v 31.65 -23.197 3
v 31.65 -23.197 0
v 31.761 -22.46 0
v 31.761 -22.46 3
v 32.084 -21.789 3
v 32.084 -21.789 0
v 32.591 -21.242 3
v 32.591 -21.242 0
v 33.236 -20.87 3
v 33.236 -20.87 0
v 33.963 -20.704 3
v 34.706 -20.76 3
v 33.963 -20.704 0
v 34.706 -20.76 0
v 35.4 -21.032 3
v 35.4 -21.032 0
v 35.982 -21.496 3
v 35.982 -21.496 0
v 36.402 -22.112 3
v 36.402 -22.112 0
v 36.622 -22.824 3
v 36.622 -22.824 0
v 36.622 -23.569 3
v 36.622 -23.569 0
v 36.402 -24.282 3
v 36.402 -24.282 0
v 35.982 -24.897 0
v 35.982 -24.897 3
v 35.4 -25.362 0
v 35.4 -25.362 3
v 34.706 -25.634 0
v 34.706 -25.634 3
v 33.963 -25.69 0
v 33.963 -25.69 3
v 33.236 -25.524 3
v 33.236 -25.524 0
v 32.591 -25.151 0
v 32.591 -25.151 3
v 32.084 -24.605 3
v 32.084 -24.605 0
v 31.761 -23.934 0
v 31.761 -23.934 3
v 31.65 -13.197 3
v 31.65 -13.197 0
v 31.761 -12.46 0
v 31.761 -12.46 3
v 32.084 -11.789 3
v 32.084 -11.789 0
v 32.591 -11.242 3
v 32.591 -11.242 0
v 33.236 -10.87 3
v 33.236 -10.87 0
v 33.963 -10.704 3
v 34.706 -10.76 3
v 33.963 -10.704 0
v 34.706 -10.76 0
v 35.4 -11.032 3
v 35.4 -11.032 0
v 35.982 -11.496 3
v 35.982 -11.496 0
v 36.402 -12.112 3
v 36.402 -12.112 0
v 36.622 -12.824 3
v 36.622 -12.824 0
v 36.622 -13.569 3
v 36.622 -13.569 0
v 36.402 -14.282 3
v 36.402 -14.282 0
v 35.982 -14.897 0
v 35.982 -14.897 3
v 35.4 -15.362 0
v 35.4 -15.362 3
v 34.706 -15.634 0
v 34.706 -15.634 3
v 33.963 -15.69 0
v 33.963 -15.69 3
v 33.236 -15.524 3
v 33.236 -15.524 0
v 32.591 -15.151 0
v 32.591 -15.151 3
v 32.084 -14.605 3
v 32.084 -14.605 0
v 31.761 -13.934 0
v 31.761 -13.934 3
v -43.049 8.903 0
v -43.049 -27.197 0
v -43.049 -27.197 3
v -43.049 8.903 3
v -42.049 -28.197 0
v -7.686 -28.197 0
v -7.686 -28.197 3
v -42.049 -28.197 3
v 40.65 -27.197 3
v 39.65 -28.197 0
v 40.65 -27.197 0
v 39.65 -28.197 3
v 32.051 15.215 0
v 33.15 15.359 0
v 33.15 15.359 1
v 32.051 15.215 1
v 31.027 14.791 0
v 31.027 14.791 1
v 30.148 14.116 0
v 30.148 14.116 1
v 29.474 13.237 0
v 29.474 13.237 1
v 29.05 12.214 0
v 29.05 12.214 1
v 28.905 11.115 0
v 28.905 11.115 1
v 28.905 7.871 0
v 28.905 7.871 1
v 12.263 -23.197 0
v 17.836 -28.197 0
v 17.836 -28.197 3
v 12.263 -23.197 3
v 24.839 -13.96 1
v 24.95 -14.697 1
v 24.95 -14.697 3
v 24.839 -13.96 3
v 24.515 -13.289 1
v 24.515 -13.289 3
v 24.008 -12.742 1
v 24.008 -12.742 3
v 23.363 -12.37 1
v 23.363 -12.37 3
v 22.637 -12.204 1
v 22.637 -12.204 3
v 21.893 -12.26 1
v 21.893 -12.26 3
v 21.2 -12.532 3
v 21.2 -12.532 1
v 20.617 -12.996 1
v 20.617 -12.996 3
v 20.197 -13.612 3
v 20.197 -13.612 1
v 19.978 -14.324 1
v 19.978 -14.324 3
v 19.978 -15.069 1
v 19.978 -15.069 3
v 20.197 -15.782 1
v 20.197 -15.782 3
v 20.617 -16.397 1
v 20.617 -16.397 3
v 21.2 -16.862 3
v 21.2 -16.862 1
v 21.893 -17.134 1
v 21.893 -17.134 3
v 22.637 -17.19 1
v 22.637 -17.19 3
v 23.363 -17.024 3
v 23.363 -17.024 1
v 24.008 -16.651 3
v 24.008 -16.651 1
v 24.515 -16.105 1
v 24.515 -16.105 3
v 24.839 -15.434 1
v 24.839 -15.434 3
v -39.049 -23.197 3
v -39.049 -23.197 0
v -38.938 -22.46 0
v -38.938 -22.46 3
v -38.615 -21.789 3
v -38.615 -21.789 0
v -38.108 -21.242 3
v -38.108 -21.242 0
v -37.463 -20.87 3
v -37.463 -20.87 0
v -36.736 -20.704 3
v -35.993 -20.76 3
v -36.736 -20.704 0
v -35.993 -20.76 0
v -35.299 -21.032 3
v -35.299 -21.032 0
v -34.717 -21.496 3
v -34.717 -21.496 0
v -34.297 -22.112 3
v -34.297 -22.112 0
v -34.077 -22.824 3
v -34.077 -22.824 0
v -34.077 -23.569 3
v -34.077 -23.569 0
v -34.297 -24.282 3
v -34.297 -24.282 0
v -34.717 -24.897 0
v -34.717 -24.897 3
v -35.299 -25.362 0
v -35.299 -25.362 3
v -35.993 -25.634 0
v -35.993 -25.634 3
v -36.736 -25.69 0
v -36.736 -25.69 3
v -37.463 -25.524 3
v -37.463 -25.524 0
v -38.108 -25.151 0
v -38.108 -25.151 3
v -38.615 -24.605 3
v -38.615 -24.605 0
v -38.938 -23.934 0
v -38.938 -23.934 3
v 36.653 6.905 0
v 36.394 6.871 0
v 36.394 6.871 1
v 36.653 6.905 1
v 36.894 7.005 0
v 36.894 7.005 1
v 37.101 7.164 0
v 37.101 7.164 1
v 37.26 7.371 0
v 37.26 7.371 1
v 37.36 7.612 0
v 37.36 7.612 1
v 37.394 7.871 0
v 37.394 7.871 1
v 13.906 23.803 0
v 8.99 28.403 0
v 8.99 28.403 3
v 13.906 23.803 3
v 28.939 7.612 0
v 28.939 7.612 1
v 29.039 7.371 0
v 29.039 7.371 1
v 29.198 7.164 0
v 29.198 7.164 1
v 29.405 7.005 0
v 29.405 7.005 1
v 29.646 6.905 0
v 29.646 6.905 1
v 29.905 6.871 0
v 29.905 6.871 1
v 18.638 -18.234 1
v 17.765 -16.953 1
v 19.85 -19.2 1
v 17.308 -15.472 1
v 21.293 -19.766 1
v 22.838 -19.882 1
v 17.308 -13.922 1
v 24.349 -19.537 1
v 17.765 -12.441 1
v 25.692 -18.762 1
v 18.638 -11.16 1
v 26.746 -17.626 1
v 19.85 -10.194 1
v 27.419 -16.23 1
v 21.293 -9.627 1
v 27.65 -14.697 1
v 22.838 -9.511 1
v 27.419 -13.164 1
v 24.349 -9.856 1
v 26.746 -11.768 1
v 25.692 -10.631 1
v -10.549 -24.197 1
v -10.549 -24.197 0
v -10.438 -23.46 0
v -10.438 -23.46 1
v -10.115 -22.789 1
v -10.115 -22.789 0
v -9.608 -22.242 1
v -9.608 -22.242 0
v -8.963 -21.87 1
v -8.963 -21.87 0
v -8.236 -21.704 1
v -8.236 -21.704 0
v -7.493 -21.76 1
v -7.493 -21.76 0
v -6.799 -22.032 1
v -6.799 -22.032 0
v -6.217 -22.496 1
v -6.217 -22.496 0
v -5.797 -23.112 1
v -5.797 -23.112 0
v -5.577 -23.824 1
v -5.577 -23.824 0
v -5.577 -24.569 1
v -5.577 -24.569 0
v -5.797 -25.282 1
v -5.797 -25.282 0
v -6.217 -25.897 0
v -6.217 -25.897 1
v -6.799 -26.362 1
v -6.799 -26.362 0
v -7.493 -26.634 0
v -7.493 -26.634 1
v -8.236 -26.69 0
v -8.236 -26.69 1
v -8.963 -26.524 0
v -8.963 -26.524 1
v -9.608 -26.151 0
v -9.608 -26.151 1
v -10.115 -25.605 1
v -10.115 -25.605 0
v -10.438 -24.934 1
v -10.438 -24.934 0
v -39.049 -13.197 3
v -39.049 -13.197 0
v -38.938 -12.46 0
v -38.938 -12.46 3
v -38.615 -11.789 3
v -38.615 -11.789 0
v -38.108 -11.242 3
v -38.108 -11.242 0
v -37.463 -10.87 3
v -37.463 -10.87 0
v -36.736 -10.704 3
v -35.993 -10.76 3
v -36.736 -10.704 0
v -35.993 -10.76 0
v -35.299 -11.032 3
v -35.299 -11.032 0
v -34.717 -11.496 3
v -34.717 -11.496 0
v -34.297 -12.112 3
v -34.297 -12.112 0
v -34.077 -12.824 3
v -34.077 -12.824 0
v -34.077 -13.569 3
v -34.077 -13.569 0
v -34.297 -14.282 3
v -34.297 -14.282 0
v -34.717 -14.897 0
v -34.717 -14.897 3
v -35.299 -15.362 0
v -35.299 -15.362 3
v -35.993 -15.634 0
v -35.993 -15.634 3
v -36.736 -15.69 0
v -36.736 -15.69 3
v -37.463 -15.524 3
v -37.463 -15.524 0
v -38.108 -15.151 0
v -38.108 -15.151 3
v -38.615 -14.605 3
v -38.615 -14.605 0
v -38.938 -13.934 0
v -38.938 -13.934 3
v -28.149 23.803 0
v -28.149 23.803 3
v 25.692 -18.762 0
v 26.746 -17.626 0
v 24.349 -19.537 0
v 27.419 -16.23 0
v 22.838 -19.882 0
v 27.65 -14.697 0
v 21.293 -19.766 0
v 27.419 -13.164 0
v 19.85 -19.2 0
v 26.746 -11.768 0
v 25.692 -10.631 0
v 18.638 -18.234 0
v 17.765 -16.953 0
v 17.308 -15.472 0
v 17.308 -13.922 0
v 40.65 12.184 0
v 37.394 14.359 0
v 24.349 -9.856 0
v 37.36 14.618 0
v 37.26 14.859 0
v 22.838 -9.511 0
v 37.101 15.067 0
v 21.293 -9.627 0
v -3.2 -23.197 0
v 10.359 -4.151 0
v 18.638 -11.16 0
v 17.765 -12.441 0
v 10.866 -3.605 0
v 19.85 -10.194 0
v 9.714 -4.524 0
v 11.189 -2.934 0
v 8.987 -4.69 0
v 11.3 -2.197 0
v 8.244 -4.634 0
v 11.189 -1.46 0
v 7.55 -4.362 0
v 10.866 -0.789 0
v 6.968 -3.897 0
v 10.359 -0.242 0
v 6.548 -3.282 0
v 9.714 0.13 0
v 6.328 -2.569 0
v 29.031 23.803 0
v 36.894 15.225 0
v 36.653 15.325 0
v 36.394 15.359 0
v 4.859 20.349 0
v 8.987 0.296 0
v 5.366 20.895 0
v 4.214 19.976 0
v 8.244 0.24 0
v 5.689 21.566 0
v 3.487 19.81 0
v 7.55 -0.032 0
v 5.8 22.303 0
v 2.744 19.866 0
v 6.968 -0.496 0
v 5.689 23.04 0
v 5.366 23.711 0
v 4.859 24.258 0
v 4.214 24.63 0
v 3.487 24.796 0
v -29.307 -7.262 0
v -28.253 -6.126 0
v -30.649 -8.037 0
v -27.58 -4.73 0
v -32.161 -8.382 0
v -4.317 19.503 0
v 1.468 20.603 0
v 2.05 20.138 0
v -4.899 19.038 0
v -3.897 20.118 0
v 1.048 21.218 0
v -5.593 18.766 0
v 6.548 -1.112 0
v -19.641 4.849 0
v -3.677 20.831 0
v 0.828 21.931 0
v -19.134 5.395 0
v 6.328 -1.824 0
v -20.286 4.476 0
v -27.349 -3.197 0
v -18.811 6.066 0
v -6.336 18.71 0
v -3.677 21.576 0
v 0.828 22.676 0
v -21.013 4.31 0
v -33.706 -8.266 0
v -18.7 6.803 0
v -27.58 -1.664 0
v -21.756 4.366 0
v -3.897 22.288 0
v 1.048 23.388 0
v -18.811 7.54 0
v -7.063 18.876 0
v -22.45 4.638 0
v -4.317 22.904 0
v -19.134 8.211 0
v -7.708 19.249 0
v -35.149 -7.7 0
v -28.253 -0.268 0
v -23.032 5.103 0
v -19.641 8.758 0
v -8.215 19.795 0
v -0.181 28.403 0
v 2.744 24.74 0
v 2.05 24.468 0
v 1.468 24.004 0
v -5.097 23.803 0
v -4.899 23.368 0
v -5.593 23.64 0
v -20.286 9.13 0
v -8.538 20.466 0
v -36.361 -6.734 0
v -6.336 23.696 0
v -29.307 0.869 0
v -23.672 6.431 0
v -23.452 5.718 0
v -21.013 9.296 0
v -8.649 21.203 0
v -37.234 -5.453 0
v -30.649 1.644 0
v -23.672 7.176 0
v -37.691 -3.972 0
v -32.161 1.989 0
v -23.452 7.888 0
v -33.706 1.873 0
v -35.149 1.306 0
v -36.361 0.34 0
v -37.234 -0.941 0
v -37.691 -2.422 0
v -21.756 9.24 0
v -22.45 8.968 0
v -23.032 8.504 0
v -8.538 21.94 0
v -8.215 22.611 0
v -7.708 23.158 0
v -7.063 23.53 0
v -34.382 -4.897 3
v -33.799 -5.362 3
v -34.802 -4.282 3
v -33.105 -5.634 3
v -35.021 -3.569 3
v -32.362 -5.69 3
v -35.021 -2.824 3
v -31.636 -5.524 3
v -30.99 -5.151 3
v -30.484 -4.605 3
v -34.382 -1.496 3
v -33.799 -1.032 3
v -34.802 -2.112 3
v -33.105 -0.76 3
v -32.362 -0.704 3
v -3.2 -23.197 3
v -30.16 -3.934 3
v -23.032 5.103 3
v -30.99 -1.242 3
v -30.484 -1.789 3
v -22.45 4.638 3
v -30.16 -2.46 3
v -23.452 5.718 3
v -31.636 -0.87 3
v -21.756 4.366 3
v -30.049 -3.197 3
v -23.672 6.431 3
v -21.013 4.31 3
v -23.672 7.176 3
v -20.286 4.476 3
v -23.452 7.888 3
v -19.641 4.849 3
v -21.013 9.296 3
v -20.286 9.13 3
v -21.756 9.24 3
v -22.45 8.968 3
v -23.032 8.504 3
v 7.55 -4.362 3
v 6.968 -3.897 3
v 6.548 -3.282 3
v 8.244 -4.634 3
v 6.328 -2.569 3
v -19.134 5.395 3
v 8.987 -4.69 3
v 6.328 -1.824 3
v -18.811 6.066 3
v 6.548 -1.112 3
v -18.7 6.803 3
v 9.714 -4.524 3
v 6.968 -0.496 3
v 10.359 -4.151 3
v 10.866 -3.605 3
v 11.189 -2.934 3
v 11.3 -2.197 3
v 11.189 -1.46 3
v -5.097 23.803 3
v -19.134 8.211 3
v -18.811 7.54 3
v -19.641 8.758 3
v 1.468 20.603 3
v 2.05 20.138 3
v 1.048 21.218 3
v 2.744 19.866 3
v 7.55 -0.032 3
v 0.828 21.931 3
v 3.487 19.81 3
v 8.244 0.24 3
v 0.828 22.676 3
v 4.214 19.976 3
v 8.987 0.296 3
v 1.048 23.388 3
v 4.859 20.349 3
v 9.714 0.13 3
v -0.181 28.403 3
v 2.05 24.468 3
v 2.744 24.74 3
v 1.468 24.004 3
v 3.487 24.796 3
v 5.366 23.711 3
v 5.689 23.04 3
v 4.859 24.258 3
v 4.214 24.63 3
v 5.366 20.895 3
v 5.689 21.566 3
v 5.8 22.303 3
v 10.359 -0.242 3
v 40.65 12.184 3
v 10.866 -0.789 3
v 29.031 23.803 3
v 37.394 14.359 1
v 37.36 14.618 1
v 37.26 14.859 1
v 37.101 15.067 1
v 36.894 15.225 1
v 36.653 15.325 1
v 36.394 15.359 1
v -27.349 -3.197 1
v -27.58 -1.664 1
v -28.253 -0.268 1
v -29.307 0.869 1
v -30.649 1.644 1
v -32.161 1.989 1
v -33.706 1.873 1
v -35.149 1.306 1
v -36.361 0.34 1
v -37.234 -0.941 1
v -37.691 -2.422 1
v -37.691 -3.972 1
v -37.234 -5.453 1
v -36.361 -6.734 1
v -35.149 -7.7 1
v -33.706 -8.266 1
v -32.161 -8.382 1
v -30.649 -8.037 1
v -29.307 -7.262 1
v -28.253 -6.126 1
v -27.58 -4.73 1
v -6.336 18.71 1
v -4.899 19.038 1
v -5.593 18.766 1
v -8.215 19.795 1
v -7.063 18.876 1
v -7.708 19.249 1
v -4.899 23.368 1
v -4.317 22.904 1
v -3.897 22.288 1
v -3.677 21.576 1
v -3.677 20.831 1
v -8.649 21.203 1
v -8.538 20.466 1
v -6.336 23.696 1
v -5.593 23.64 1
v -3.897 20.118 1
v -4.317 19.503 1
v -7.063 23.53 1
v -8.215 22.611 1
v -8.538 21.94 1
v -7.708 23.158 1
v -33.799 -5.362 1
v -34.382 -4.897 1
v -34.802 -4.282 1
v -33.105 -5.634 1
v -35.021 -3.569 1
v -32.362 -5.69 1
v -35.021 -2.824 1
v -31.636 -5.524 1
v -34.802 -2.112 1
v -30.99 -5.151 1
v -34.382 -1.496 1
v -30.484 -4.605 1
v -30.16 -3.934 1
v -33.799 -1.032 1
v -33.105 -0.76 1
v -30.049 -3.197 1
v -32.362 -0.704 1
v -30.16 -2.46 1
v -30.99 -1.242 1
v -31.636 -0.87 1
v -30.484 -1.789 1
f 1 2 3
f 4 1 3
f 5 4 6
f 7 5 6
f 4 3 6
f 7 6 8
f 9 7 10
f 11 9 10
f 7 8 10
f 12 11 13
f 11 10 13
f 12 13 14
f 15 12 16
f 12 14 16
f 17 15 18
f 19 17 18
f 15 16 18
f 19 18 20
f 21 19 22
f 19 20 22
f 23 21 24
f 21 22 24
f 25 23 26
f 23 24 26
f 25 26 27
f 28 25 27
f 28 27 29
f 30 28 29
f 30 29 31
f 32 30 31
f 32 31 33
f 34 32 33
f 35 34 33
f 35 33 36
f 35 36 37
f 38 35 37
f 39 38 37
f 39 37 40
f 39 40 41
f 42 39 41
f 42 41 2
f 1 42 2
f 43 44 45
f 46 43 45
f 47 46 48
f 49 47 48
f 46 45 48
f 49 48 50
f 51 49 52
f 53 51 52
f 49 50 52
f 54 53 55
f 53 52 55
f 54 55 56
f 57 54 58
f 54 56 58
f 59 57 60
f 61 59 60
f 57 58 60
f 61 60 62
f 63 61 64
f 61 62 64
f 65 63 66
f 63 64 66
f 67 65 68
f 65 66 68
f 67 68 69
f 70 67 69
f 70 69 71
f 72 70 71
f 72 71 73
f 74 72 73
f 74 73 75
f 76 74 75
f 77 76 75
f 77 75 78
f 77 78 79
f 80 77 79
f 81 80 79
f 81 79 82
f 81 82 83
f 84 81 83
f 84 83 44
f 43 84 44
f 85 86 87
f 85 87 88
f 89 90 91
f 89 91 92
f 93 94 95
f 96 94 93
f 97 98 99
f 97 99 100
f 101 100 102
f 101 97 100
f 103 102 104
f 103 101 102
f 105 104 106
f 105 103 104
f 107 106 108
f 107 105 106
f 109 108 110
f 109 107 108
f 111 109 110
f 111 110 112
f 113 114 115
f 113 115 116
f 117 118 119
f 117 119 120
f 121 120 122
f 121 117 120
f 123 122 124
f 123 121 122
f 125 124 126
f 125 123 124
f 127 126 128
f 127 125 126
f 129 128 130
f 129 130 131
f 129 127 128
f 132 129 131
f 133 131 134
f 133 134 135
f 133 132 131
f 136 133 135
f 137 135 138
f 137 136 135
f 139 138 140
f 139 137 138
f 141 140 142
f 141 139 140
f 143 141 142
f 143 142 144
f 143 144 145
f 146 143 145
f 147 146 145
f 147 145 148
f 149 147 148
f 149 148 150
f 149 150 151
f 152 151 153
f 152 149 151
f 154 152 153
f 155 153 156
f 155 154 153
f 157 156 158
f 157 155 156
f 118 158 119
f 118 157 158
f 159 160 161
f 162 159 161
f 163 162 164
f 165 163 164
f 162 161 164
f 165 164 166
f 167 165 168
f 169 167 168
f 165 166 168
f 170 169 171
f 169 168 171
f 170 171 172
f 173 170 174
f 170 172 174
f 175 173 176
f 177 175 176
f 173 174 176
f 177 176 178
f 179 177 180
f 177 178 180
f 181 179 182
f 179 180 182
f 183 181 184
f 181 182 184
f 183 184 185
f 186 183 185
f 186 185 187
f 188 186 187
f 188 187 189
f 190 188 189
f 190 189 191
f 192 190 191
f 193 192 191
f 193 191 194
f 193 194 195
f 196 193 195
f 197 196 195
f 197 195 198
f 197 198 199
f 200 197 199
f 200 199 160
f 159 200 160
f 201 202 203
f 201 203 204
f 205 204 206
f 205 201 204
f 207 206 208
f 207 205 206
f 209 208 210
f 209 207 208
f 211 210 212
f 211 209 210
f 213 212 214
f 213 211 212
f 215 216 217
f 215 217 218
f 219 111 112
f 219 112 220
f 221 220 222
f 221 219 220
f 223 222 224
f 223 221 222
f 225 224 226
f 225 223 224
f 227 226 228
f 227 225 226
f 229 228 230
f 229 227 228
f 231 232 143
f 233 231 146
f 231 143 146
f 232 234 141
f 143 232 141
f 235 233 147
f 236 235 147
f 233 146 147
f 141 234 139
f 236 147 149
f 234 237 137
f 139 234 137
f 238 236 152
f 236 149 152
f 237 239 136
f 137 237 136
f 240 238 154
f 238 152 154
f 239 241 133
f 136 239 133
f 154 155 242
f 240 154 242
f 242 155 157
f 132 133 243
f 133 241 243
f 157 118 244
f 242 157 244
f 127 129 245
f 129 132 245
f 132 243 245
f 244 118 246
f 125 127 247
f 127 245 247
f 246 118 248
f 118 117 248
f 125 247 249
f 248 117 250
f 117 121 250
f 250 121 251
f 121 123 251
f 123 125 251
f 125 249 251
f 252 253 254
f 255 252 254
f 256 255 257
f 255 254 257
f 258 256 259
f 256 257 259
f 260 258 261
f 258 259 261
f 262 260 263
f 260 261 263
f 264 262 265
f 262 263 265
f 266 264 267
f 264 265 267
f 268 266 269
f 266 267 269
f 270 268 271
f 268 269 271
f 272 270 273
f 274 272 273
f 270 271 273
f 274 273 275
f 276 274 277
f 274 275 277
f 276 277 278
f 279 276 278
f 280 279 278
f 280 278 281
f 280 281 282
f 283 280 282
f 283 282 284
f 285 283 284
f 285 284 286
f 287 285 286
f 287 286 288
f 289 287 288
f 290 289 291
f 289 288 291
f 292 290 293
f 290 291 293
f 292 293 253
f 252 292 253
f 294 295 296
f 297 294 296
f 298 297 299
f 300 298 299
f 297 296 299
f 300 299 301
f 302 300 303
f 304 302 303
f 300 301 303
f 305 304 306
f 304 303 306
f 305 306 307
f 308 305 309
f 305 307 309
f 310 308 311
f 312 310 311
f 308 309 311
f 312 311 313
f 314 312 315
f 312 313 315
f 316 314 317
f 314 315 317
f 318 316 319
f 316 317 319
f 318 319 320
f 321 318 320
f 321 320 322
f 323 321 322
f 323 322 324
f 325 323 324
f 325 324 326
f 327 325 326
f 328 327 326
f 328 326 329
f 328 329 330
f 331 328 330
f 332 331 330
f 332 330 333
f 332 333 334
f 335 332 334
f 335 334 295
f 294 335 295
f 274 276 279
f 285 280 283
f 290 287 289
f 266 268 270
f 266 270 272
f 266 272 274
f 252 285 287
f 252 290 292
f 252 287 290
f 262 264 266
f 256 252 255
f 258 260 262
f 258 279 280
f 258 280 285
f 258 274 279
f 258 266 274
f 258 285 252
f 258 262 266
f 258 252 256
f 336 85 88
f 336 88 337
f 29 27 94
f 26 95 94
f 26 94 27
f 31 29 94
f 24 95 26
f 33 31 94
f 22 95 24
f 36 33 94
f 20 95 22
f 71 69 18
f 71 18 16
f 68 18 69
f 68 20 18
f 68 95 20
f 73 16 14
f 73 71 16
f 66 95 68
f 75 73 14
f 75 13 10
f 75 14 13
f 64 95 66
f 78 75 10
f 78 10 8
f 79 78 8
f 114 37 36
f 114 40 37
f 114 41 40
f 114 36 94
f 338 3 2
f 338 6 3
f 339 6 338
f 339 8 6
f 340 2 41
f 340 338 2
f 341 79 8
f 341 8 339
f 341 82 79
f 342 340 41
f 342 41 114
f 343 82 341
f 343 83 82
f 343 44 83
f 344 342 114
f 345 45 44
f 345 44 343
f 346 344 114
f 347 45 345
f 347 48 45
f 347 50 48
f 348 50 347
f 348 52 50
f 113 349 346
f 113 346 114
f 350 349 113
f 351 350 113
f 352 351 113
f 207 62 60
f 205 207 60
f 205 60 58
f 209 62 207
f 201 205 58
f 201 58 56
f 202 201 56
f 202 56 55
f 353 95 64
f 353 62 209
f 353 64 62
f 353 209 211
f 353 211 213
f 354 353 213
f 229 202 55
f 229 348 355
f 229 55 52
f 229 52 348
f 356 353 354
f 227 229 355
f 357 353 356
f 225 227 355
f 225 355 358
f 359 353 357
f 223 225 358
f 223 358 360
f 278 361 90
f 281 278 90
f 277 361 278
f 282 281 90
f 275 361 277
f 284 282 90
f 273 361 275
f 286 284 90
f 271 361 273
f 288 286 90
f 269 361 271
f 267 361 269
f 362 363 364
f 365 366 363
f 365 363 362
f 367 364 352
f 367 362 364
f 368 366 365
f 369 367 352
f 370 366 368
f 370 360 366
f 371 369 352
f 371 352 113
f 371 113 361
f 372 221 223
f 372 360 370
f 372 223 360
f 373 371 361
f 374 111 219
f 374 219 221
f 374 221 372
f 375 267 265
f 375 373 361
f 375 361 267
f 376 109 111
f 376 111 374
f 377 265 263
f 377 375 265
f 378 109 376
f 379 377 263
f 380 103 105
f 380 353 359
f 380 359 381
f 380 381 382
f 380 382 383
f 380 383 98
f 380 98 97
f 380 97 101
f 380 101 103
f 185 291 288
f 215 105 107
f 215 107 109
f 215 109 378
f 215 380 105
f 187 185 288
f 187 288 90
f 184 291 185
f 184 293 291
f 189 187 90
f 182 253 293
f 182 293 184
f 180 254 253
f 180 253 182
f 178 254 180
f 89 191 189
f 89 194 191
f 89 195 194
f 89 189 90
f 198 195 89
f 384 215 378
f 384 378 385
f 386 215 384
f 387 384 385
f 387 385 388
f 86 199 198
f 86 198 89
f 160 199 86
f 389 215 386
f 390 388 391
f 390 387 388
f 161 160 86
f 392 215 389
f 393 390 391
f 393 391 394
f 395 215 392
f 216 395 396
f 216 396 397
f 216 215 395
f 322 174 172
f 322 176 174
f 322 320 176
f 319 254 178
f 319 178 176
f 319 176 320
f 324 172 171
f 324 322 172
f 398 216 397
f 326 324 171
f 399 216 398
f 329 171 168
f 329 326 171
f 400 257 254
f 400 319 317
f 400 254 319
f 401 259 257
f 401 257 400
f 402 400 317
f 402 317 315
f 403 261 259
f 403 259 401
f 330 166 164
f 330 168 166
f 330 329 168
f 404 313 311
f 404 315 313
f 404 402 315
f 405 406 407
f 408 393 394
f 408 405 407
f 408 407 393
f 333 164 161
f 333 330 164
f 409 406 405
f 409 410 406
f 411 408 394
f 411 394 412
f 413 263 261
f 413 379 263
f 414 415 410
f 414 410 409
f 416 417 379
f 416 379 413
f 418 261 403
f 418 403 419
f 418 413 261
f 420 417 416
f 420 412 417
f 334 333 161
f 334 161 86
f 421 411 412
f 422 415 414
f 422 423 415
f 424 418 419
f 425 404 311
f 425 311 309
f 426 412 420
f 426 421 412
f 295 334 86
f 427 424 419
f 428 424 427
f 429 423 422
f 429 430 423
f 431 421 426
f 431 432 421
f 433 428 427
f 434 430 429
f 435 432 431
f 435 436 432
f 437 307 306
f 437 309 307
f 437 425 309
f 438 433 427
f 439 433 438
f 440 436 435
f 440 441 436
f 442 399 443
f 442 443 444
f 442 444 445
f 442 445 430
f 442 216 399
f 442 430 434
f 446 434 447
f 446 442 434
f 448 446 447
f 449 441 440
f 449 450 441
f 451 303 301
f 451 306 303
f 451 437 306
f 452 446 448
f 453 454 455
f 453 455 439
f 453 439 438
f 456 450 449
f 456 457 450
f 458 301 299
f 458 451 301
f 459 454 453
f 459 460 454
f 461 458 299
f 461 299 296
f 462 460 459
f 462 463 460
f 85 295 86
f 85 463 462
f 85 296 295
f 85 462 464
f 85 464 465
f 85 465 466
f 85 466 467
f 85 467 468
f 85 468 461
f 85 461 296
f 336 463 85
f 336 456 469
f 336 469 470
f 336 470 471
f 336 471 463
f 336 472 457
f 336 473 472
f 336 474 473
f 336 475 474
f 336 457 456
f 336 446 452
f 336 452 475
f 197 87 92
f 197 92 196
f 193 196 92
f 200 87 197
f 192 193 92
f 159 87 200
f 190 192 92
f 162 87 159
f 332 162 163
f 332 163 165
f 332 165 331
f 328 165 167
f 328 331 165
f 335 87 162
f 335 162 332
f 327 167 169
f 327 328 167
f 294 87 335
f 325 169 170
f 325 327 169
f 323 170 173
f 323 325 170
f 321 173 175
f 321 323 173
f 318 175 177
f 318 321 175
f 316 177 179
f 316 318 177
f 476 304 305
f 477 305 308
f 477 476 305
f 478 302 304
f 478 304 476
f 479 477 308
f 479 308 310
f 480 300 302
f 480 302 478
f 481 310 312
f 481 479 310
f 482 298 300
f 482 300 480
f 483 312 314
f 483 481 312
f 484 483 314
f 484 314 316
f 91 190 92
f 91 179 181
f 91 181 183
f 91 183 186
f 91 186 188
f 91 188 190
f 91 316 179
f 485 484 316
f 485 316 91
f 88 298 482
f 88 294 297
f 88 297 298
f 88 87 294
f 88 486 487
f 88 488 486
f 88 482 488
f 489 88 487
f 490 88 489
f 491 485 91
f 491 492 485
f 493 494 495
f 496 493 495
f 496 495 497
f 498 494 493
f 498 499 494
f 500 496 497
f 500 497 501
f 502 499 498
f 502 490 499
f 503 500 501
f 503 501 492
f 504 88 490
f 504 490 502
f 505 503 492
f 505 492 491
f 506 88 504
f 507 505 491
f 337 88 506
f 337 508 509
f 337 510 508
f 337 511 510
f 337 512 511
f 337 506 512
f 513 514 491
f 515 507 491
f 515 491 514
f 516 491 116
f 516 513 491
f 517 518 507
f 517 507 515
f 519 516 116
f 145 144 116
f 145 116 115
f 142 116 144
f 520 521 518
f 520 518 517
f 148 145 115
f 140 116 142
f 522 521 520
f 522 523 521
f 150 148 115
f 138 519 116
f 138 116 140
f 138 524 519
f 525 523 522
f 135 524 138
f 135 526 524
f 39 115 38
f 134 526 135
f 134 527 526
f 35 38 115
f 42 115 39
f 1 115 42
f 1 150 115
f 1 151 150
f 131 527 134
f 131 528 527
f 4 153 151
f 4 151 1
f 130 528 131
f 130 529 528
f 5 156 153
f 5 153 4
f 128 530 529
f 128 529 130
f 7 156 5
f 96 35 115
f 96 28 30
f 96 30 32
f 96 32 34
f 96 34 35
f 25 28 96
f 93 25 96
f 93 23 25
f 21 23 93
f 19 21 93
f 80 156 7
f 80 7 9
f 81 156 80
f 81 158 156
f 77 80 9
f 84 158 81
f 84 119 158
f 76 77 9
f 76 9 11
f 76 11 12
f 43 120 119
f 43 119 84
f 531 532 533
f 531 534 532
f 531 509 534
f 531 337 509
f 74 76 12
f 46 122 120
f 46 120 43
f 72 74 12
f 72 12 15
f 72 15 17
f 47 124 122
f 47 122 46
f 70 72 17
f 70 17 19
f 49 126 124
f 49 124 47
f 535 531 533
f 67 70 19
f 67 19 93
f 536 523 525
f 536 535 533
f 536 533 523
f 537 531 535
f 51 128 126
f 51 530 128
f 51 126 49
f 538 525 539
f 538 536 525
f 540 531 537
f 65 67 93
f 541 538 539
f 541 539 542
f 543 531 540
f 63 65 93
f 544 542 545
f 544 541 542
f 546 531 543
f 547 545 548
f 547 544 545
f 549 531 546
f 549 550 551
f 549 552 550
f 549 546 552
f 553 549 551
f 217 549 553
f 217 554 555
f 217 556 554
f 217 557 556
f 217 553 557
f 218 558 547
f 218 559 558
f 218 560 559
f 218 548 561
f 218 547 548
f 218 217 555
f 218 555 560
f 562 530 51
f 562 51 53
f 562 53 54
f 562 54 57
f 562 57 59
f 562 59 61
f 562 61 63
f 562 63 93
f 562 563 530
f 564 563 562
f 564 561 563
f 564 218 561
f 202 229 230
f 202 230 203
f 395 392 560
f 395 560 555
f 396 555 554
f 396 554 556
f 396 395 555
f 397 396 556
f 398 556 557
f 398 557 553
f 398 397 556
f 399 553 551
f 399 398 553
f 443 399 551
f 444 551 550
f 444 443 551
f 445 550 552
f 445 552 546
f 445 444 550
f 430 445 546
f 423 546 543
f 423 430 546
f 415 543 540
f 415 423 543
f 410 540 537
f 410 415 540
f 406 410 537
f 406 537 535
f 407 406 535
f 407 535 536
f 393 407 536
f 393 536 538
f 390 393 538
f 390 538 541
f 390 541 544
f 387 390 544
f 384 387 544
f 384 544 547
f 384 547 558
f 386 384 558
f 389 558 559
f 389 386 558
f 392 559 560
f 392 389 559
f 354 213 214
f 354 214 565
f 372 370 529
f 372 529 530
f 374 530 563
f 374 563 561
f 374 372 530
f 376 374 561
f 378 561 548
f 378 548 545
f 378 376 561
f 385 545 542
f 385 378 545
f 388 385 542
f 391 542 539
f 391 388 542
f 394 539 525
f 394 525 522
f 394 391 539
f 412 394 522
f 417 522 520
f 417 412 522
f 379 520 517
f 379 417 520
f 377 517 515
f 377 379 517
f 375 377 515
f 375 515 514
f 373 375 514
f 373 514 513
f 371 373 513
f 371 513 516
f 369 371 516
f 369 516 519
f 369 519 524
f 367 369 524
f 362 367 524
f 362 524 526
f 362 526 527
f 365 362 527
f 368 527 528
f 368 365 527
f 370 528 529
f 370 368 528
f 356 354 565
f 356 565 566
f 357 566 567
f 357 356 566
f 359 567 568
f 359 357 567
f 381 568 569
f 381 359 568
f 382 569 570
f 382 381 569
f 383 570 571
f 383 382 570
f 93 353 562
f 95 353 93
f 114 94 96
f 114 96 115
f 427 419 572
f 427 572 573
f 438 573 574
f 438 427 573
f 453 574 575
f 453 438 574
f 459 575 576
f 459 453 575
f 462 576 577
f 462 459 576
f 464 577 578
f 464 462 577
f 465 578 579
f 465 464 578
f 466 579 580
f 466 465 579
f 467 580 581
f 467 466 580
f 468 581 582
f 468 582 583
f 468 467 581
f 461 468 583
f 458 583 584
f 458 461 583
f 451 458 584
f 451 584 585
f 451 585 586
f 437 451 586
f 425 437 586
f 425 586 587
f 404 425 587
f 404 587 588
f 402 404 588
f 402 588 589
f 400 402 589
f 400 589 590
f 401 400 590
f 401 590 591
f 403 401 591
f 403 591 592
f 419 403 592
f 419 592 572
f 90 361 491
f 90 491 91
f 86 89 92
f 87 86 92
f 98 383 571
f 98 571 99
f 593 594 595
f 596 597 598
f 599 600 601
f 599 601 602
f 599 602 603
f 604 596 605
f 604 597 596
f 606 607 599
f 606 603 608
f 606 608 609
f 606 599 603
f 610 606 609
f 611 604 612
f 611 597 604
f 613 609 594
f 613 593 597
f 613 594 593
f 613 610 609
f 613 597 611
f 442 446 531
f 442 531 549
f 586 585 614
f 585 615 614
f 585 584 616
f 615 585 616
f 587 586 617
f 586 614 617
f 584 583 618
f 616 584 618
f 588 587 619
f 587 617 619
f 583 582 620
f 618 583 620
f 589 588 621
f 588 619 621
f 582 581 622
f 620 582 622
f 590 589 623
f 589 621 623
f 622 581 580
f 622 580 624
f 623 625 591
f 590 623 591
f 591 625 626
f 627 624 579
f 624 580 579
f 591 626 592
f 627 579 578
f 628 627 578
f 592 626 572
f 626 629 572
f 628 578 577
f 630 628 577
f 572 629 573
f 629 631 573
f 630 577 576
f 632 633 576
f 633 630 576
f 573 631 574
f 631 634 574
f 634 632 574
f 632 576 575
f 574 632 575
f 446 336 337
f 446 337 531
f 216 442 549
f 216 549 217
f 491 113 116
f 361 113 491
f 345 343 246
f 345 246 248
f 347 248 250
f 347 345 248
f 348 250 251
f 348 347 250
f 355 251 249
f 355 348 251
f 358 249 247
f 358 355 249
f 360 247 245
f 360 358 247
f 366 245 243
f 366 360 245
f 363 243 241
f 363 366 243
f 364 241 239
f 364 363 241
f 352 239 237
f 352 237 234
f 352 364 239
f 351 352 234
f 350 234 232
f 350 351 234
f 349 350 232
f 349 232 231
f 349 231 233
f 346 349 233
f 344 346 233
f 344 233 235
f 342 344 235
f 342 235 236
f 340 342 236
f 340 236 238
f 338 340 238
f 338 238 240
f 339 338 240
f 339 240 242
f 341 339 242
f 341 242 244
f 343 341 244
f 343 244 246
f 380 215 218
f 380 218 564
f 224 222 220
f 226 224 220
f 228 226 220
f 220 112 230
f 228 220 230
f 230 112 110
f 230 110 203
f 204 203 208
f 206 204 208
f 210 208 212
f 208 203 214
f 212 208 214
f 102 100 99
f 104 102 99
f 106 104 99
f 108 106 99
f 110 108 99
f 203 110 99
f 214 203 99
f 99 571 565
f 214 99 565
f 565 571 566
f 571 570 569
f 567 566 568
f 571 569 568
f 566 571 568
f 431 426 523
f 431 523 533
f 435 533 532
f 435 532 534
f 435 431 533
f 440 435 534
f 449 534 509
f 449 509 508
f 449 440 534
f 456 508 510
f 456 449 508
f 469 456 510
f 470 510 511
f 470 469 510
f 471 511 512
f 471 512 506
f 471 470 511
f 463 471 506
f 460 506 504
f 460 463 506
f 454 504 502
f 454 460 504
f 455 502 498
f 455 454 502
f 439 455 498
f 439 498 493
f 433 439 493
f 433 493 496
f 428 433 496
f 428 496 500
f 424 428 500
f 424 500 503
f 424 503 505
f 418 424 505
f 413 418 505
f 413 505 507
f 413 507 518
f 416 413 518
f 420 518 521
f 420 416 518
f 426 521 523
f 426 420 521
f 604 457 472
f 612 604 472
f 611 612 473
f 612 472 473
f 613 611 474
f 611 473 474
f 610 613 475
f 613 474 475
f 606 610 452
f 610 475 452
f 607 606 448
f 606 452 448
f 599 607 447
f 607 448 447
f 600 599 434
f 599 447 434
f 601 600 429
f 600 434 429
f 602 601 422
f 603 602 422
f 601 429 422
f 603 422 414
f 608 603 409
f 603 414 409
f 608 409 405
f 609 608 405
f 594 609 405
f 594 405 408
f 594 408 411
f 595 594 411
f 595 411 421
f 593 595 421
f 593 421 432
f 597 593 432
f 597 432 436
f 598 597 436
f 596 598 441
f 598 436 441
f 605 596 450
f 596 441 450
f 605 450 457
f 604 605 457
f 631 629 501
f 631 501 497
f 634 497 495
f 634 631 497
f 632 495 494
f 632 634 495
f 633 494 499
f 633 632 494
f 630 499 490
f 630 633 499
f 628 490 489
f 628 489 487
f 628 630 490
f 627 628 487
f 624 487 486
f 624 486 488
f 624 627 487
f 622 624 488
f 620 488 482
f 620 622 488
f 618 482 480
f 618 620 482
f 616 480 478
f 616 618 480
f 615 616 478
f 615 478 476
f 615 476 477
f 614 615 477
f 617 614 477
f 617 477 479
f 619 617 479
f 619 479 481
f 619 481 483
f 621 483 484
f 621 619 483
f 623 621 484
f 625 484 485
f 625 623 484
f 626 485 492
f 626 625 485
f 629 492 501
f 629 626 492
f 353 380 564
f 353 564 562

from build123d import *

# Parameters (mm, degrees)
SKETCH_1_R          = 5.2
SKETCH_1_R_2        = 2.5
EXTRUDE_1_DEPTH     = 3
EXTRUDE_START       = -2
SKETCH_3_R          = 5.2
SKETCH_3_R_2        = 2.5
EXTRUDE_3_DEPTH     = 2
SKETCH_7_R          = 2.5
CUT_EXTRUDE_1_DEPTH = 1
CUT_EXTRUDE_2_REACH = 53.662
SKETCH_9_R          = 2.5
CHAMFER_1_SIZE      = 1


with BuildPart() as part:
    # 스케치1 → 보스-돌출1 (new body)
    with BuildSketch(Plane.XY):
        Polygon((13.906175134, 23.803132686), (29.030703027, 23.803132686), (40.649680384, 12.184155329), (40.649680384, -28.196867314), (17.836321525, -28.196867314), (12.263074219, -23.196867314), (-3.200474103, -23.196867314), (-7.686189276, -28.196867314), (-43.049187557, -28.196867314), (-43.049187557, 8.903282862), (-28.149337734, 23.803132686), (-5.096572968, 23.803132686), (-0.180708362, 28.403132686), (8.990310529, 28.403132686), align=None)
        with Locations((22.449680384, -14.696867314)):
            Circle(SKETCH_1_R, mode=Mode.SUBTRACT)
        with Locations((-32.549187557, -3.196867314)):
            Circle(SKETCH_1_R, mode=Mode.SUBTRACT)
        with Locations((8.800246413, -2.196867314)):
            Circle(SKETCH_1_R_2, mode=Mode.SUBTRACT)
        with Locations((3.300246413, 22.303132686)):
            Circle(SKETCH_1_R_2, mode=Mode.SUBTRACT)
        with Locations((-21.199753587, 6.803132686)):
            Circle(SKETCH_1_R_2, mode=Mode.SUBTRACT)
    extrude(amount=EXTRUDE_1_DEPTH)

    # 스케치3 → 보스-돌출3 (add)
    # profile 1 of 2: a face of its own
    with BuildSketch(Plane.XY.offset(3).offset(EXTRUDE_START)):
        with Locations((-32.549187557, -3.196867314)):
            Circle(SKETCH_3_R)
        with Locations((-32.549187557, -3.196867314)):
            Circle(SKETCH_3_R_2, mode=Mode.SUBTRACT)
    # profile 2 of 2: a face of its own
    with BuildSketch(Plane.XY.offset(3).offset(EXTRUDE_START)):
        with Locations((22.449680384, -14.696867314)):
            Circle(SKETCH_3_R)
        with Locations((22.449680384, -14.696867314)):
            Circle(SKETCH_3_R_2, mode=Mode.SUBTRACT)
    extrude(amount=EXTRUDE_3_DEPTH)

    # 스케치7 → 컷-돌출1 (cut)
    with BuildSketch(Plane(origin=(0, 0, 0), x_dir=(-1, 0, 0), z_dir=(0, 0, -1))):
        with Locations((8.049187557, -24.196867314)):
            Circle(SKETCH_7_R)
        with Locations((6.149337734, 21.203132686)):
            Circle(SKETCH_7_R)
        with BuildLine():
            Line((-37.39408004, 7.870627017), (-37.39408004, 14.359426329))
            ThreePointArc((-37.39408004, 14.359426329), (-37.101186821, 15.066533111), (-36.39408004, 15.359426329))
            Line((-36.39408004, 15.359426329), (-33.149680384, 15.359426329))
            ThreePointArc((-33.149680384, 15.359426329), (-30.148436605, 14.116270452), (-28.905280727, 11.115026673))
            Line((-28.905280727, 11.115026673), (-28.905280727, 7.870627017))
            ThreePointArc((-28.905280727, 7.870627017), (-29.198173946, 7.163520236), (-29.905280727, 6.870627017))
            Line((-29.905280727, 6.870627017), (-36.39408004, 6.870627017))
            ThreePointArc((-36.39408004, 6.870627017), (-37.101186821, 7.163520236), (-37.39408004, 7.870627017))
        make_face()
    extrude(amount=-CUT_EXTRUDE_1_DEPTH, mode=Mode.SUBTRACT)

    # 스케치9 → 컷-돌출2 (cut, up to next)
    with BuildSketch(Plane(origin=(0, 0, 0), x_dir=(-1, 0, 0), z_dir=(0, 0, -1)), mode=Mode.PRIVATE) as cut_extrude_2_sk1:
        with Locations((-34.149680384, -13.196867314)):
            Circle(SKETCH_9_R)
    cut_extrude_2_tool1 = extrude(cut_extrude_2_sk1.sketch, amount=-CUT_EXTRUDE_2_REACH, mode=Mode.PRIVATE) & part.part
    # 스케치9 → 컷-돌출2 (cut, up to next)
    with BuildSketch(Plane(origin=(0, 0, 0), x_dir=(-1, 0, 0), z_dir=(0, 0, -1)), mode=Mode.PRIVATE) as cut_extrude_2_sk2:
        with Locations((-34.149680384, -23.196867314)):
            Circle(SKETCH_9_R)
    cut_extrude_2_tool2 = extrude(cut_extrude_2_sk2.sketch, amount=-CUT_EXTRUDE_2_REACH, mode=Mode.PRIVATE) & part.part
    # 스케치9 → 컷-돌출2 (cut, up to next)
    with BuildSketch(Plane(origin=(0, 0, 0), x_dir=(-1, 0, 0), z_dir=(0, 0, -1)), mode=Mode.PRIVATE) as cut_extrude_2_sk3:
        with Locations((36.549187557, -13.196867314)):
            Circle(SKETCH_9_R)
    cut_extrude_2_tool3 = extrude(cut_extrude_2_sk3.sketch, amount=-CUT_EXTRUDE_2_REACH, mode=Mode.PRIVATE) & part.part
    # 스케치9 → 컷-돌출2 (cut, up to next)
    with BuildSketch(Plane(origin=(0, 0, 0), x_dir=(-1, 0, 0), z_dir=(0, 0, -1)), mode=Mode.PRIVATE) as cut_extrude_2_sk4:
        with Locations((36.549187557, -23.196867314)):
            Circle(SKETCH_9_R)
    cut_extrude_2_tool4 = extrude(cut_extrude_2_sk4.sketch, amount=-CUT_EXTRUDE_2_REACH, mode=Mode.PRIVATE) & part.part
    add(cut_extrude_2_tool1.solids().sort_by_distance((34.14968, -13.196867, 0))[0], mode=Mode.SUBTRACT)
    add(cut_extrude_2_tool2.solids().sort_by_distance((34.14968, -23.196867, 0))[0], mode=Mode.SUBTRACT)
    add(cut_extrude_2_tool3.solids().sort_by_distance((-36.549188, -13.196867, 0))[0], mode=Mode.SUBTRACT)
    add(cut_extrude_2_tool4.solids().sort_by_distance((-36.549188, -23.196867, 0))[0], mode=Mode.SUBTRACT)

    # 모따기1
    chamfer_1_edges = [part.edges().sort_by_distance(p)[0] for p in [
        (40.649680384, -28.196867314, 1.5),
        (-43.049187557, -28.196867314, 1.5),
    ]]
    chamfer(chamfer_1_edges, length=CHAMFER_1_SIZE)


solid = part.part
